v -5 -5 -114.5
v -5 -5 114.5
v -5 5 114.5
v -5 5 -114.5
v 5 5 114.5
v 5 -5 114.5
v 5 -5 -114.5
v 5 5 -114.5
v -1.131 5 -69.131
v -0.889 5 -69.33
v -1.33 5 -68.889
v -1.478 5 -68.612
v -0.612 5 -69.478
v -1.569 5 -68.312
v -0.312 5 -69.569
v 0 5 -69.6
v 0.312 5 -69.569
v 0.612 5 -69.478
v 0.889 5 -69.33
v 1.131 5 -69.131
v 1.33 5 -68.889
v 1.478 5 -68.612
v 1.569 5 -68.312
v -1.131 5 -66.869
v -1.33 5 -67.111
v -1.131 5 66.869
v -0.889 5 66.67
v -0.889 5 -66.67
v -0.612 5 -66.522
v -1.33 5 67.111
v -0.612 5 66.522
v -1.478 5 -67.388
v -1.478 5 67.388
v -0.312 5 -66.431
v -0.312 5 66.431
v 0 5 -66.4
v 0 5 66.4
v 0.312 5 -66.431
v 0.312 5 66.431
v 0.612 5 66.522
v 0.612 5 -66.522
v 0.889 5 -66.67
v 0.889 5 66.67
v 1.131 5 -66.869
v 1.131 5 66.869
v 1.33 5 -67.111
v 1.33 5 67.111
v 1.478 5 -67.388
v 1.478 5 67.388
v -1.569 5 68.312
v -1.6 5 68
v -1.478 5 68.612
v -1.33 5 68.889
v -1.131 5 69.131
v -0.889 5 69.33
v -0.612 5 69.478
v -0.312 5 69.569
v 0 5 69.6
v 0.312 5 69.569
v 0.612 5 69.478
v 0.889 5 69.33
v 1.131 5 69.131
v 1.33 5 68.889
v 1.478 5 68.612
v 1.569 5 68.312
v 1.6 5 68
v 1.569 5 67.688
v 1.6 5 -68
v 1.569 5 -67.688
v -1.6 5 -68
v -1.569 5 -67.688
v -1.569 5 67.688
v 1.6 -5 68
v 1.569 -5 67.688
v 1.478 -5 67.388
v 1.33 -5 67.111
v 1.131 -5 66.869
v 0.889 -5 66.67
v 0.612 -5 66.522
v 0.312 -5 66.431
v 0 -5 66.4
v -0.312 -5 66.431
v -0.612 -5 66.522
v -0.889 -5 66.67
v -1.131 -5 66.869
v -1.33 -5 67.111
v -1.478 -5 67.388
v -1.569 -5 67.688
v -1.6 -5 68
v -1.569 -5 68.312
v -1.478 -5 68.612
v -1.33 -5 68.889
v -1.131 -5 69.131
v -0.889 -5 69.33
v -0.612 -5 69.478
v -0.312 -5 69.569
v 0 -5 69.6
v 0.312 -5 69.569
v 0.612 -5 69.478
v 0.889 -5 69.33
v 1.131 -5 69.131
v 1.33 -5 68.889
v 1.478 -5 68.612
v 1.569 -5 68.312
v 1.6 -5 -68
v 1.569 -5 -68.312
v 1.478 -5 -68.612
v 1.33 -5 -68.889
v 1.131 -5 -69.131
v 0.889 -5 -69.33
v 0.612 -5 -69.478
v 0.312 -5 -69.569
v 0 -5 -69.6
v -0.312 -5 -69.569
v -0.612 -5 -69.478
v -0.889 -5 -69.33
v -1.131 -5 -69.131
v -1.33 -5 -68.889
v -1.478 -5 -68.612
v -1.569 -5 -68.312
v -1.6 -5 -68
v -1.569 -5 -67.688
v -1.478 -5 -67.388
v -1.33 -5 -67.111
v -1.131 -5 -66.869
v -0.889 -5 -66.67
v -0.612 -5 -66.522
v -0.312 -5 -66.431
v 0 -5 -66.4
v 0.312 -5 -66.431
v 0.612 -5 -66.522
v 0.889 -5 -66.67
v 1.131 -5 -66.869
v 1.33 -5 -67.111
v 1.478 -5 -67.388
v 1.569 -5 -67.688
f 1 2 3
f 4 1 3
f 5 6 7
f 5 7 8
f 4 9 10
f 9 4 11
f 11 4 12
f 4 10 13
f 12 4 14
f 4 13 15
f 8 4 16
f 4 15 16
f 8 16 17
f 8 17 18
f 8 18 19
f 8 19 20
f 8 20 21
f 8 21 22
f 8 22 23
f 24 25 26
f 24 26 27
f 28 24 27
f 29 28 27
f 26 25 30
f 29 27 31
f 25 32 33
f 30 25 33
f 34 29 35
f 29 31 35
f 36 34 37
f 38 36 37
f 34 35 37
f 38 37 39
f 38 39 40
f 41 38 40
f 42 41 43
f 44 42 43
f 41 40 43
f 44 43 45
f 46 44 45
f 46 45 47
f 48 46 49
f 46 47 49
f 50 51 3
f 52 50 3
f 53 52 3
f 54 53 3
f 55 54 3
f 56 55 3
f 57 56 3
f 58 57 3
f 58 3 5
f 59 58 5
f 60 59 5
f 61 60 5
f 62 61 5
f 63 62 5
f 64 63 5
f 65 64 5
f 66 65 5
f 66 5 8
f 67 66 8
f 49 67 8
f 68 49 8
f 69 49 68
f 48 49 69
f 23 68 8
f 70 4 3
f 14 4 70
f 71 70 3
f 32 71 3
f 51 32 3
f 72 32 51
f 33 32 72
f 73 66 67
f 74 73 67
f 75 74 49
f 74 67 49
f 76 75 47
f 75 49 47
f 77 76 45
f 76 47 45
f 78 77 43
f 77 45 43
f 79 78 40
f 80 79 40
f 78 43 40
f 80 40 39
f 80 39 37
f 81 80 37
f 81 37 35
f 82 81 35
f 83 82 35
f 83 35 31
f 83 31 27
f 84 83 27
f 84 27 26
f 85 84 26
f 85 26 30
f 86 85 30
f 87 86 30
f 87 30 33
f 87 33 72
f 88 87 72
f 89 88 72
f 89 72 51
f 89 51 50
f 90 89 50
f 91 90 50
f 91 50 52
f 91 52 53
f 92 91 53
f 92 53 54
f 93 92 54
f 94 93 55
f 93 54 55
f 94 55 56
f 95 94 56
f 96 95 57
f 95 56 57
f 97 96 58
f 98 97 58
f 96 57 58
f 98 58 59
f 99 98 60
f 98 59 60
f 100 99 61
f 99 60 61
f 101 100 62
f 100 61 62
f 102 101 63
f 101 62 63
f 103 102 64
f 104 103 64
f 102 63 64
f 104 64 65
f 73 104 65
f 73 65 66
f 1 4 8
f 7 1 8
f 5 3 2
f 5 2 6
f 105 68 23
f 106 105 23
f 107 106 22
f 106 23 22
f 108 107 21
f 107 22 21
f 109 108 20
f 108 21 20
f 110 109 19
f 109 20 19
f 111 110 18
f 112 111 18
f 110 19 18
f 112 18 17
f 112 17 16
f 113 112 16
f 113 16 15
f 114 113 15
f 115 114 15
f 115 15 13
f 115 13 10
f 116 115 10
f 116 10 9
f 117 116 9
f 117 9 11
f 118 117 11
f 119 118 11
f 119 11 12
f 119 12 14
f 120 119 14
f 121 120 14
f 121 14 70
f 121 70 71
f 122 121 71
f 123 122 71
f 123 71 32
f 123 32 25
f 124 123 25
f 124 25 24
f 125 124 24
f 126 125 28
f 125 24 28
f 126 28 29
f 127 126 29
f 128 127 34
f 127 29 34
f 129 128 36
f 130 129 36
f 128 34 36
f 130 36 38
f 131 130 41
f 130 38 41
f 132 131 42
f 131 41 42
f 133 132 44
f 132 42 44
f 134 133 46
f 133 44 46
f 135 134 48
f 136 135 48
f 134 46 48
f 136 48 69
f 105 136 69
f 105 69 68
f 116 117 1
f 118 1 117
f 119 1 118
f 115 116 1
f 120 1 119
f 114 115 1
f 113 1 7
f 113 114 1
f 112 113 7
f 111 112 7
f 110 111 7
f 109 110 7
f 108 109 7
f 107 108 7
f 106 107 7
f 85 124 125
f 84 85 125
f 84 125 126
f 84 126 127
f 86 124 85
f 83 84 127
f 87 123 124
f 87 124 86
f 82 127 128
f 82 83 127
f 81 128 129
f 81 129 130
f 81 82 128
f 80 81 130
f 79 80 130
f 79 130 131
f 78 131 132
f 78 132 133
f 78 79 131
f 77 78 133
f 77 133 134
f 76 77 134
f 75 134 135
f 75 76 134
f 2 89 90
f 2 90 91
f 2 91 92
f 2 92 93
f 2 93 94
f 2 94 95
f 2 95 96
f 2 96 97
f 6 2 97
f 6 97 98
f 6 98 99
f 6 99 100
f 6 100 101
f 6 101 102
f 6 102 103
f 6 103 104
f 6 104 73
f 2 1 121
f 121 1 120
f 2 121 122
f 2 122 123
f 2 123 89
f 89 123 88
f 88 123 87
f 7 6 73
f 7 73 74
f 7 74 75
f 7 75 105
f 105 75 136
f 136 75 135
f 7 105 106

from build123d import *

# Parameters (mm, degrees)
ESQUISSE1_W             = 10
ESQUISSE1_H             = 10
BOSS_EXTRU_1_DEPTH      = 114.5
BOSS_EXTRU_1_DEPTH_BACK = 114.5
ESQUISSE2_R             = 1.6
ENL_V_MAT_EXTRU_1_DEPTH = 11


with BuildPart() as part:
    # Esquisse1 → Boss.-Extru.1 (new body, two sides)
    with BuildSketch(Plane.XY) as boss_extru_1_sk:
        Rectangle(ESQUISSE1_W, ESQUISSE1_H)
    extrude(amount=BOSS_EXTRU_1_DEPTH)
    extrude(boss_extru_1_sk.sketch, amount=-BOSS_EXTRU_1_DEPTH_BACK)

    # Esquisse2 → Enlèv. mat.-Extru.1 (cut, through all)
    with BuildSketch(Plane(origin=(0, 5, 0), x_dir=(1, 0, 0), z_dir=(0, 1, 0))):
        with Locations((0, 68)):
            Circle(ESQUISSE2_R)
        with Locations((0, -68)):
            Circle(ESQUISSE2_R)
    extrude(amount=-ENL_V_MAT_EXTRU_1_DEPTH, mode=Mode.SUBTRACT)


solid = part.part
